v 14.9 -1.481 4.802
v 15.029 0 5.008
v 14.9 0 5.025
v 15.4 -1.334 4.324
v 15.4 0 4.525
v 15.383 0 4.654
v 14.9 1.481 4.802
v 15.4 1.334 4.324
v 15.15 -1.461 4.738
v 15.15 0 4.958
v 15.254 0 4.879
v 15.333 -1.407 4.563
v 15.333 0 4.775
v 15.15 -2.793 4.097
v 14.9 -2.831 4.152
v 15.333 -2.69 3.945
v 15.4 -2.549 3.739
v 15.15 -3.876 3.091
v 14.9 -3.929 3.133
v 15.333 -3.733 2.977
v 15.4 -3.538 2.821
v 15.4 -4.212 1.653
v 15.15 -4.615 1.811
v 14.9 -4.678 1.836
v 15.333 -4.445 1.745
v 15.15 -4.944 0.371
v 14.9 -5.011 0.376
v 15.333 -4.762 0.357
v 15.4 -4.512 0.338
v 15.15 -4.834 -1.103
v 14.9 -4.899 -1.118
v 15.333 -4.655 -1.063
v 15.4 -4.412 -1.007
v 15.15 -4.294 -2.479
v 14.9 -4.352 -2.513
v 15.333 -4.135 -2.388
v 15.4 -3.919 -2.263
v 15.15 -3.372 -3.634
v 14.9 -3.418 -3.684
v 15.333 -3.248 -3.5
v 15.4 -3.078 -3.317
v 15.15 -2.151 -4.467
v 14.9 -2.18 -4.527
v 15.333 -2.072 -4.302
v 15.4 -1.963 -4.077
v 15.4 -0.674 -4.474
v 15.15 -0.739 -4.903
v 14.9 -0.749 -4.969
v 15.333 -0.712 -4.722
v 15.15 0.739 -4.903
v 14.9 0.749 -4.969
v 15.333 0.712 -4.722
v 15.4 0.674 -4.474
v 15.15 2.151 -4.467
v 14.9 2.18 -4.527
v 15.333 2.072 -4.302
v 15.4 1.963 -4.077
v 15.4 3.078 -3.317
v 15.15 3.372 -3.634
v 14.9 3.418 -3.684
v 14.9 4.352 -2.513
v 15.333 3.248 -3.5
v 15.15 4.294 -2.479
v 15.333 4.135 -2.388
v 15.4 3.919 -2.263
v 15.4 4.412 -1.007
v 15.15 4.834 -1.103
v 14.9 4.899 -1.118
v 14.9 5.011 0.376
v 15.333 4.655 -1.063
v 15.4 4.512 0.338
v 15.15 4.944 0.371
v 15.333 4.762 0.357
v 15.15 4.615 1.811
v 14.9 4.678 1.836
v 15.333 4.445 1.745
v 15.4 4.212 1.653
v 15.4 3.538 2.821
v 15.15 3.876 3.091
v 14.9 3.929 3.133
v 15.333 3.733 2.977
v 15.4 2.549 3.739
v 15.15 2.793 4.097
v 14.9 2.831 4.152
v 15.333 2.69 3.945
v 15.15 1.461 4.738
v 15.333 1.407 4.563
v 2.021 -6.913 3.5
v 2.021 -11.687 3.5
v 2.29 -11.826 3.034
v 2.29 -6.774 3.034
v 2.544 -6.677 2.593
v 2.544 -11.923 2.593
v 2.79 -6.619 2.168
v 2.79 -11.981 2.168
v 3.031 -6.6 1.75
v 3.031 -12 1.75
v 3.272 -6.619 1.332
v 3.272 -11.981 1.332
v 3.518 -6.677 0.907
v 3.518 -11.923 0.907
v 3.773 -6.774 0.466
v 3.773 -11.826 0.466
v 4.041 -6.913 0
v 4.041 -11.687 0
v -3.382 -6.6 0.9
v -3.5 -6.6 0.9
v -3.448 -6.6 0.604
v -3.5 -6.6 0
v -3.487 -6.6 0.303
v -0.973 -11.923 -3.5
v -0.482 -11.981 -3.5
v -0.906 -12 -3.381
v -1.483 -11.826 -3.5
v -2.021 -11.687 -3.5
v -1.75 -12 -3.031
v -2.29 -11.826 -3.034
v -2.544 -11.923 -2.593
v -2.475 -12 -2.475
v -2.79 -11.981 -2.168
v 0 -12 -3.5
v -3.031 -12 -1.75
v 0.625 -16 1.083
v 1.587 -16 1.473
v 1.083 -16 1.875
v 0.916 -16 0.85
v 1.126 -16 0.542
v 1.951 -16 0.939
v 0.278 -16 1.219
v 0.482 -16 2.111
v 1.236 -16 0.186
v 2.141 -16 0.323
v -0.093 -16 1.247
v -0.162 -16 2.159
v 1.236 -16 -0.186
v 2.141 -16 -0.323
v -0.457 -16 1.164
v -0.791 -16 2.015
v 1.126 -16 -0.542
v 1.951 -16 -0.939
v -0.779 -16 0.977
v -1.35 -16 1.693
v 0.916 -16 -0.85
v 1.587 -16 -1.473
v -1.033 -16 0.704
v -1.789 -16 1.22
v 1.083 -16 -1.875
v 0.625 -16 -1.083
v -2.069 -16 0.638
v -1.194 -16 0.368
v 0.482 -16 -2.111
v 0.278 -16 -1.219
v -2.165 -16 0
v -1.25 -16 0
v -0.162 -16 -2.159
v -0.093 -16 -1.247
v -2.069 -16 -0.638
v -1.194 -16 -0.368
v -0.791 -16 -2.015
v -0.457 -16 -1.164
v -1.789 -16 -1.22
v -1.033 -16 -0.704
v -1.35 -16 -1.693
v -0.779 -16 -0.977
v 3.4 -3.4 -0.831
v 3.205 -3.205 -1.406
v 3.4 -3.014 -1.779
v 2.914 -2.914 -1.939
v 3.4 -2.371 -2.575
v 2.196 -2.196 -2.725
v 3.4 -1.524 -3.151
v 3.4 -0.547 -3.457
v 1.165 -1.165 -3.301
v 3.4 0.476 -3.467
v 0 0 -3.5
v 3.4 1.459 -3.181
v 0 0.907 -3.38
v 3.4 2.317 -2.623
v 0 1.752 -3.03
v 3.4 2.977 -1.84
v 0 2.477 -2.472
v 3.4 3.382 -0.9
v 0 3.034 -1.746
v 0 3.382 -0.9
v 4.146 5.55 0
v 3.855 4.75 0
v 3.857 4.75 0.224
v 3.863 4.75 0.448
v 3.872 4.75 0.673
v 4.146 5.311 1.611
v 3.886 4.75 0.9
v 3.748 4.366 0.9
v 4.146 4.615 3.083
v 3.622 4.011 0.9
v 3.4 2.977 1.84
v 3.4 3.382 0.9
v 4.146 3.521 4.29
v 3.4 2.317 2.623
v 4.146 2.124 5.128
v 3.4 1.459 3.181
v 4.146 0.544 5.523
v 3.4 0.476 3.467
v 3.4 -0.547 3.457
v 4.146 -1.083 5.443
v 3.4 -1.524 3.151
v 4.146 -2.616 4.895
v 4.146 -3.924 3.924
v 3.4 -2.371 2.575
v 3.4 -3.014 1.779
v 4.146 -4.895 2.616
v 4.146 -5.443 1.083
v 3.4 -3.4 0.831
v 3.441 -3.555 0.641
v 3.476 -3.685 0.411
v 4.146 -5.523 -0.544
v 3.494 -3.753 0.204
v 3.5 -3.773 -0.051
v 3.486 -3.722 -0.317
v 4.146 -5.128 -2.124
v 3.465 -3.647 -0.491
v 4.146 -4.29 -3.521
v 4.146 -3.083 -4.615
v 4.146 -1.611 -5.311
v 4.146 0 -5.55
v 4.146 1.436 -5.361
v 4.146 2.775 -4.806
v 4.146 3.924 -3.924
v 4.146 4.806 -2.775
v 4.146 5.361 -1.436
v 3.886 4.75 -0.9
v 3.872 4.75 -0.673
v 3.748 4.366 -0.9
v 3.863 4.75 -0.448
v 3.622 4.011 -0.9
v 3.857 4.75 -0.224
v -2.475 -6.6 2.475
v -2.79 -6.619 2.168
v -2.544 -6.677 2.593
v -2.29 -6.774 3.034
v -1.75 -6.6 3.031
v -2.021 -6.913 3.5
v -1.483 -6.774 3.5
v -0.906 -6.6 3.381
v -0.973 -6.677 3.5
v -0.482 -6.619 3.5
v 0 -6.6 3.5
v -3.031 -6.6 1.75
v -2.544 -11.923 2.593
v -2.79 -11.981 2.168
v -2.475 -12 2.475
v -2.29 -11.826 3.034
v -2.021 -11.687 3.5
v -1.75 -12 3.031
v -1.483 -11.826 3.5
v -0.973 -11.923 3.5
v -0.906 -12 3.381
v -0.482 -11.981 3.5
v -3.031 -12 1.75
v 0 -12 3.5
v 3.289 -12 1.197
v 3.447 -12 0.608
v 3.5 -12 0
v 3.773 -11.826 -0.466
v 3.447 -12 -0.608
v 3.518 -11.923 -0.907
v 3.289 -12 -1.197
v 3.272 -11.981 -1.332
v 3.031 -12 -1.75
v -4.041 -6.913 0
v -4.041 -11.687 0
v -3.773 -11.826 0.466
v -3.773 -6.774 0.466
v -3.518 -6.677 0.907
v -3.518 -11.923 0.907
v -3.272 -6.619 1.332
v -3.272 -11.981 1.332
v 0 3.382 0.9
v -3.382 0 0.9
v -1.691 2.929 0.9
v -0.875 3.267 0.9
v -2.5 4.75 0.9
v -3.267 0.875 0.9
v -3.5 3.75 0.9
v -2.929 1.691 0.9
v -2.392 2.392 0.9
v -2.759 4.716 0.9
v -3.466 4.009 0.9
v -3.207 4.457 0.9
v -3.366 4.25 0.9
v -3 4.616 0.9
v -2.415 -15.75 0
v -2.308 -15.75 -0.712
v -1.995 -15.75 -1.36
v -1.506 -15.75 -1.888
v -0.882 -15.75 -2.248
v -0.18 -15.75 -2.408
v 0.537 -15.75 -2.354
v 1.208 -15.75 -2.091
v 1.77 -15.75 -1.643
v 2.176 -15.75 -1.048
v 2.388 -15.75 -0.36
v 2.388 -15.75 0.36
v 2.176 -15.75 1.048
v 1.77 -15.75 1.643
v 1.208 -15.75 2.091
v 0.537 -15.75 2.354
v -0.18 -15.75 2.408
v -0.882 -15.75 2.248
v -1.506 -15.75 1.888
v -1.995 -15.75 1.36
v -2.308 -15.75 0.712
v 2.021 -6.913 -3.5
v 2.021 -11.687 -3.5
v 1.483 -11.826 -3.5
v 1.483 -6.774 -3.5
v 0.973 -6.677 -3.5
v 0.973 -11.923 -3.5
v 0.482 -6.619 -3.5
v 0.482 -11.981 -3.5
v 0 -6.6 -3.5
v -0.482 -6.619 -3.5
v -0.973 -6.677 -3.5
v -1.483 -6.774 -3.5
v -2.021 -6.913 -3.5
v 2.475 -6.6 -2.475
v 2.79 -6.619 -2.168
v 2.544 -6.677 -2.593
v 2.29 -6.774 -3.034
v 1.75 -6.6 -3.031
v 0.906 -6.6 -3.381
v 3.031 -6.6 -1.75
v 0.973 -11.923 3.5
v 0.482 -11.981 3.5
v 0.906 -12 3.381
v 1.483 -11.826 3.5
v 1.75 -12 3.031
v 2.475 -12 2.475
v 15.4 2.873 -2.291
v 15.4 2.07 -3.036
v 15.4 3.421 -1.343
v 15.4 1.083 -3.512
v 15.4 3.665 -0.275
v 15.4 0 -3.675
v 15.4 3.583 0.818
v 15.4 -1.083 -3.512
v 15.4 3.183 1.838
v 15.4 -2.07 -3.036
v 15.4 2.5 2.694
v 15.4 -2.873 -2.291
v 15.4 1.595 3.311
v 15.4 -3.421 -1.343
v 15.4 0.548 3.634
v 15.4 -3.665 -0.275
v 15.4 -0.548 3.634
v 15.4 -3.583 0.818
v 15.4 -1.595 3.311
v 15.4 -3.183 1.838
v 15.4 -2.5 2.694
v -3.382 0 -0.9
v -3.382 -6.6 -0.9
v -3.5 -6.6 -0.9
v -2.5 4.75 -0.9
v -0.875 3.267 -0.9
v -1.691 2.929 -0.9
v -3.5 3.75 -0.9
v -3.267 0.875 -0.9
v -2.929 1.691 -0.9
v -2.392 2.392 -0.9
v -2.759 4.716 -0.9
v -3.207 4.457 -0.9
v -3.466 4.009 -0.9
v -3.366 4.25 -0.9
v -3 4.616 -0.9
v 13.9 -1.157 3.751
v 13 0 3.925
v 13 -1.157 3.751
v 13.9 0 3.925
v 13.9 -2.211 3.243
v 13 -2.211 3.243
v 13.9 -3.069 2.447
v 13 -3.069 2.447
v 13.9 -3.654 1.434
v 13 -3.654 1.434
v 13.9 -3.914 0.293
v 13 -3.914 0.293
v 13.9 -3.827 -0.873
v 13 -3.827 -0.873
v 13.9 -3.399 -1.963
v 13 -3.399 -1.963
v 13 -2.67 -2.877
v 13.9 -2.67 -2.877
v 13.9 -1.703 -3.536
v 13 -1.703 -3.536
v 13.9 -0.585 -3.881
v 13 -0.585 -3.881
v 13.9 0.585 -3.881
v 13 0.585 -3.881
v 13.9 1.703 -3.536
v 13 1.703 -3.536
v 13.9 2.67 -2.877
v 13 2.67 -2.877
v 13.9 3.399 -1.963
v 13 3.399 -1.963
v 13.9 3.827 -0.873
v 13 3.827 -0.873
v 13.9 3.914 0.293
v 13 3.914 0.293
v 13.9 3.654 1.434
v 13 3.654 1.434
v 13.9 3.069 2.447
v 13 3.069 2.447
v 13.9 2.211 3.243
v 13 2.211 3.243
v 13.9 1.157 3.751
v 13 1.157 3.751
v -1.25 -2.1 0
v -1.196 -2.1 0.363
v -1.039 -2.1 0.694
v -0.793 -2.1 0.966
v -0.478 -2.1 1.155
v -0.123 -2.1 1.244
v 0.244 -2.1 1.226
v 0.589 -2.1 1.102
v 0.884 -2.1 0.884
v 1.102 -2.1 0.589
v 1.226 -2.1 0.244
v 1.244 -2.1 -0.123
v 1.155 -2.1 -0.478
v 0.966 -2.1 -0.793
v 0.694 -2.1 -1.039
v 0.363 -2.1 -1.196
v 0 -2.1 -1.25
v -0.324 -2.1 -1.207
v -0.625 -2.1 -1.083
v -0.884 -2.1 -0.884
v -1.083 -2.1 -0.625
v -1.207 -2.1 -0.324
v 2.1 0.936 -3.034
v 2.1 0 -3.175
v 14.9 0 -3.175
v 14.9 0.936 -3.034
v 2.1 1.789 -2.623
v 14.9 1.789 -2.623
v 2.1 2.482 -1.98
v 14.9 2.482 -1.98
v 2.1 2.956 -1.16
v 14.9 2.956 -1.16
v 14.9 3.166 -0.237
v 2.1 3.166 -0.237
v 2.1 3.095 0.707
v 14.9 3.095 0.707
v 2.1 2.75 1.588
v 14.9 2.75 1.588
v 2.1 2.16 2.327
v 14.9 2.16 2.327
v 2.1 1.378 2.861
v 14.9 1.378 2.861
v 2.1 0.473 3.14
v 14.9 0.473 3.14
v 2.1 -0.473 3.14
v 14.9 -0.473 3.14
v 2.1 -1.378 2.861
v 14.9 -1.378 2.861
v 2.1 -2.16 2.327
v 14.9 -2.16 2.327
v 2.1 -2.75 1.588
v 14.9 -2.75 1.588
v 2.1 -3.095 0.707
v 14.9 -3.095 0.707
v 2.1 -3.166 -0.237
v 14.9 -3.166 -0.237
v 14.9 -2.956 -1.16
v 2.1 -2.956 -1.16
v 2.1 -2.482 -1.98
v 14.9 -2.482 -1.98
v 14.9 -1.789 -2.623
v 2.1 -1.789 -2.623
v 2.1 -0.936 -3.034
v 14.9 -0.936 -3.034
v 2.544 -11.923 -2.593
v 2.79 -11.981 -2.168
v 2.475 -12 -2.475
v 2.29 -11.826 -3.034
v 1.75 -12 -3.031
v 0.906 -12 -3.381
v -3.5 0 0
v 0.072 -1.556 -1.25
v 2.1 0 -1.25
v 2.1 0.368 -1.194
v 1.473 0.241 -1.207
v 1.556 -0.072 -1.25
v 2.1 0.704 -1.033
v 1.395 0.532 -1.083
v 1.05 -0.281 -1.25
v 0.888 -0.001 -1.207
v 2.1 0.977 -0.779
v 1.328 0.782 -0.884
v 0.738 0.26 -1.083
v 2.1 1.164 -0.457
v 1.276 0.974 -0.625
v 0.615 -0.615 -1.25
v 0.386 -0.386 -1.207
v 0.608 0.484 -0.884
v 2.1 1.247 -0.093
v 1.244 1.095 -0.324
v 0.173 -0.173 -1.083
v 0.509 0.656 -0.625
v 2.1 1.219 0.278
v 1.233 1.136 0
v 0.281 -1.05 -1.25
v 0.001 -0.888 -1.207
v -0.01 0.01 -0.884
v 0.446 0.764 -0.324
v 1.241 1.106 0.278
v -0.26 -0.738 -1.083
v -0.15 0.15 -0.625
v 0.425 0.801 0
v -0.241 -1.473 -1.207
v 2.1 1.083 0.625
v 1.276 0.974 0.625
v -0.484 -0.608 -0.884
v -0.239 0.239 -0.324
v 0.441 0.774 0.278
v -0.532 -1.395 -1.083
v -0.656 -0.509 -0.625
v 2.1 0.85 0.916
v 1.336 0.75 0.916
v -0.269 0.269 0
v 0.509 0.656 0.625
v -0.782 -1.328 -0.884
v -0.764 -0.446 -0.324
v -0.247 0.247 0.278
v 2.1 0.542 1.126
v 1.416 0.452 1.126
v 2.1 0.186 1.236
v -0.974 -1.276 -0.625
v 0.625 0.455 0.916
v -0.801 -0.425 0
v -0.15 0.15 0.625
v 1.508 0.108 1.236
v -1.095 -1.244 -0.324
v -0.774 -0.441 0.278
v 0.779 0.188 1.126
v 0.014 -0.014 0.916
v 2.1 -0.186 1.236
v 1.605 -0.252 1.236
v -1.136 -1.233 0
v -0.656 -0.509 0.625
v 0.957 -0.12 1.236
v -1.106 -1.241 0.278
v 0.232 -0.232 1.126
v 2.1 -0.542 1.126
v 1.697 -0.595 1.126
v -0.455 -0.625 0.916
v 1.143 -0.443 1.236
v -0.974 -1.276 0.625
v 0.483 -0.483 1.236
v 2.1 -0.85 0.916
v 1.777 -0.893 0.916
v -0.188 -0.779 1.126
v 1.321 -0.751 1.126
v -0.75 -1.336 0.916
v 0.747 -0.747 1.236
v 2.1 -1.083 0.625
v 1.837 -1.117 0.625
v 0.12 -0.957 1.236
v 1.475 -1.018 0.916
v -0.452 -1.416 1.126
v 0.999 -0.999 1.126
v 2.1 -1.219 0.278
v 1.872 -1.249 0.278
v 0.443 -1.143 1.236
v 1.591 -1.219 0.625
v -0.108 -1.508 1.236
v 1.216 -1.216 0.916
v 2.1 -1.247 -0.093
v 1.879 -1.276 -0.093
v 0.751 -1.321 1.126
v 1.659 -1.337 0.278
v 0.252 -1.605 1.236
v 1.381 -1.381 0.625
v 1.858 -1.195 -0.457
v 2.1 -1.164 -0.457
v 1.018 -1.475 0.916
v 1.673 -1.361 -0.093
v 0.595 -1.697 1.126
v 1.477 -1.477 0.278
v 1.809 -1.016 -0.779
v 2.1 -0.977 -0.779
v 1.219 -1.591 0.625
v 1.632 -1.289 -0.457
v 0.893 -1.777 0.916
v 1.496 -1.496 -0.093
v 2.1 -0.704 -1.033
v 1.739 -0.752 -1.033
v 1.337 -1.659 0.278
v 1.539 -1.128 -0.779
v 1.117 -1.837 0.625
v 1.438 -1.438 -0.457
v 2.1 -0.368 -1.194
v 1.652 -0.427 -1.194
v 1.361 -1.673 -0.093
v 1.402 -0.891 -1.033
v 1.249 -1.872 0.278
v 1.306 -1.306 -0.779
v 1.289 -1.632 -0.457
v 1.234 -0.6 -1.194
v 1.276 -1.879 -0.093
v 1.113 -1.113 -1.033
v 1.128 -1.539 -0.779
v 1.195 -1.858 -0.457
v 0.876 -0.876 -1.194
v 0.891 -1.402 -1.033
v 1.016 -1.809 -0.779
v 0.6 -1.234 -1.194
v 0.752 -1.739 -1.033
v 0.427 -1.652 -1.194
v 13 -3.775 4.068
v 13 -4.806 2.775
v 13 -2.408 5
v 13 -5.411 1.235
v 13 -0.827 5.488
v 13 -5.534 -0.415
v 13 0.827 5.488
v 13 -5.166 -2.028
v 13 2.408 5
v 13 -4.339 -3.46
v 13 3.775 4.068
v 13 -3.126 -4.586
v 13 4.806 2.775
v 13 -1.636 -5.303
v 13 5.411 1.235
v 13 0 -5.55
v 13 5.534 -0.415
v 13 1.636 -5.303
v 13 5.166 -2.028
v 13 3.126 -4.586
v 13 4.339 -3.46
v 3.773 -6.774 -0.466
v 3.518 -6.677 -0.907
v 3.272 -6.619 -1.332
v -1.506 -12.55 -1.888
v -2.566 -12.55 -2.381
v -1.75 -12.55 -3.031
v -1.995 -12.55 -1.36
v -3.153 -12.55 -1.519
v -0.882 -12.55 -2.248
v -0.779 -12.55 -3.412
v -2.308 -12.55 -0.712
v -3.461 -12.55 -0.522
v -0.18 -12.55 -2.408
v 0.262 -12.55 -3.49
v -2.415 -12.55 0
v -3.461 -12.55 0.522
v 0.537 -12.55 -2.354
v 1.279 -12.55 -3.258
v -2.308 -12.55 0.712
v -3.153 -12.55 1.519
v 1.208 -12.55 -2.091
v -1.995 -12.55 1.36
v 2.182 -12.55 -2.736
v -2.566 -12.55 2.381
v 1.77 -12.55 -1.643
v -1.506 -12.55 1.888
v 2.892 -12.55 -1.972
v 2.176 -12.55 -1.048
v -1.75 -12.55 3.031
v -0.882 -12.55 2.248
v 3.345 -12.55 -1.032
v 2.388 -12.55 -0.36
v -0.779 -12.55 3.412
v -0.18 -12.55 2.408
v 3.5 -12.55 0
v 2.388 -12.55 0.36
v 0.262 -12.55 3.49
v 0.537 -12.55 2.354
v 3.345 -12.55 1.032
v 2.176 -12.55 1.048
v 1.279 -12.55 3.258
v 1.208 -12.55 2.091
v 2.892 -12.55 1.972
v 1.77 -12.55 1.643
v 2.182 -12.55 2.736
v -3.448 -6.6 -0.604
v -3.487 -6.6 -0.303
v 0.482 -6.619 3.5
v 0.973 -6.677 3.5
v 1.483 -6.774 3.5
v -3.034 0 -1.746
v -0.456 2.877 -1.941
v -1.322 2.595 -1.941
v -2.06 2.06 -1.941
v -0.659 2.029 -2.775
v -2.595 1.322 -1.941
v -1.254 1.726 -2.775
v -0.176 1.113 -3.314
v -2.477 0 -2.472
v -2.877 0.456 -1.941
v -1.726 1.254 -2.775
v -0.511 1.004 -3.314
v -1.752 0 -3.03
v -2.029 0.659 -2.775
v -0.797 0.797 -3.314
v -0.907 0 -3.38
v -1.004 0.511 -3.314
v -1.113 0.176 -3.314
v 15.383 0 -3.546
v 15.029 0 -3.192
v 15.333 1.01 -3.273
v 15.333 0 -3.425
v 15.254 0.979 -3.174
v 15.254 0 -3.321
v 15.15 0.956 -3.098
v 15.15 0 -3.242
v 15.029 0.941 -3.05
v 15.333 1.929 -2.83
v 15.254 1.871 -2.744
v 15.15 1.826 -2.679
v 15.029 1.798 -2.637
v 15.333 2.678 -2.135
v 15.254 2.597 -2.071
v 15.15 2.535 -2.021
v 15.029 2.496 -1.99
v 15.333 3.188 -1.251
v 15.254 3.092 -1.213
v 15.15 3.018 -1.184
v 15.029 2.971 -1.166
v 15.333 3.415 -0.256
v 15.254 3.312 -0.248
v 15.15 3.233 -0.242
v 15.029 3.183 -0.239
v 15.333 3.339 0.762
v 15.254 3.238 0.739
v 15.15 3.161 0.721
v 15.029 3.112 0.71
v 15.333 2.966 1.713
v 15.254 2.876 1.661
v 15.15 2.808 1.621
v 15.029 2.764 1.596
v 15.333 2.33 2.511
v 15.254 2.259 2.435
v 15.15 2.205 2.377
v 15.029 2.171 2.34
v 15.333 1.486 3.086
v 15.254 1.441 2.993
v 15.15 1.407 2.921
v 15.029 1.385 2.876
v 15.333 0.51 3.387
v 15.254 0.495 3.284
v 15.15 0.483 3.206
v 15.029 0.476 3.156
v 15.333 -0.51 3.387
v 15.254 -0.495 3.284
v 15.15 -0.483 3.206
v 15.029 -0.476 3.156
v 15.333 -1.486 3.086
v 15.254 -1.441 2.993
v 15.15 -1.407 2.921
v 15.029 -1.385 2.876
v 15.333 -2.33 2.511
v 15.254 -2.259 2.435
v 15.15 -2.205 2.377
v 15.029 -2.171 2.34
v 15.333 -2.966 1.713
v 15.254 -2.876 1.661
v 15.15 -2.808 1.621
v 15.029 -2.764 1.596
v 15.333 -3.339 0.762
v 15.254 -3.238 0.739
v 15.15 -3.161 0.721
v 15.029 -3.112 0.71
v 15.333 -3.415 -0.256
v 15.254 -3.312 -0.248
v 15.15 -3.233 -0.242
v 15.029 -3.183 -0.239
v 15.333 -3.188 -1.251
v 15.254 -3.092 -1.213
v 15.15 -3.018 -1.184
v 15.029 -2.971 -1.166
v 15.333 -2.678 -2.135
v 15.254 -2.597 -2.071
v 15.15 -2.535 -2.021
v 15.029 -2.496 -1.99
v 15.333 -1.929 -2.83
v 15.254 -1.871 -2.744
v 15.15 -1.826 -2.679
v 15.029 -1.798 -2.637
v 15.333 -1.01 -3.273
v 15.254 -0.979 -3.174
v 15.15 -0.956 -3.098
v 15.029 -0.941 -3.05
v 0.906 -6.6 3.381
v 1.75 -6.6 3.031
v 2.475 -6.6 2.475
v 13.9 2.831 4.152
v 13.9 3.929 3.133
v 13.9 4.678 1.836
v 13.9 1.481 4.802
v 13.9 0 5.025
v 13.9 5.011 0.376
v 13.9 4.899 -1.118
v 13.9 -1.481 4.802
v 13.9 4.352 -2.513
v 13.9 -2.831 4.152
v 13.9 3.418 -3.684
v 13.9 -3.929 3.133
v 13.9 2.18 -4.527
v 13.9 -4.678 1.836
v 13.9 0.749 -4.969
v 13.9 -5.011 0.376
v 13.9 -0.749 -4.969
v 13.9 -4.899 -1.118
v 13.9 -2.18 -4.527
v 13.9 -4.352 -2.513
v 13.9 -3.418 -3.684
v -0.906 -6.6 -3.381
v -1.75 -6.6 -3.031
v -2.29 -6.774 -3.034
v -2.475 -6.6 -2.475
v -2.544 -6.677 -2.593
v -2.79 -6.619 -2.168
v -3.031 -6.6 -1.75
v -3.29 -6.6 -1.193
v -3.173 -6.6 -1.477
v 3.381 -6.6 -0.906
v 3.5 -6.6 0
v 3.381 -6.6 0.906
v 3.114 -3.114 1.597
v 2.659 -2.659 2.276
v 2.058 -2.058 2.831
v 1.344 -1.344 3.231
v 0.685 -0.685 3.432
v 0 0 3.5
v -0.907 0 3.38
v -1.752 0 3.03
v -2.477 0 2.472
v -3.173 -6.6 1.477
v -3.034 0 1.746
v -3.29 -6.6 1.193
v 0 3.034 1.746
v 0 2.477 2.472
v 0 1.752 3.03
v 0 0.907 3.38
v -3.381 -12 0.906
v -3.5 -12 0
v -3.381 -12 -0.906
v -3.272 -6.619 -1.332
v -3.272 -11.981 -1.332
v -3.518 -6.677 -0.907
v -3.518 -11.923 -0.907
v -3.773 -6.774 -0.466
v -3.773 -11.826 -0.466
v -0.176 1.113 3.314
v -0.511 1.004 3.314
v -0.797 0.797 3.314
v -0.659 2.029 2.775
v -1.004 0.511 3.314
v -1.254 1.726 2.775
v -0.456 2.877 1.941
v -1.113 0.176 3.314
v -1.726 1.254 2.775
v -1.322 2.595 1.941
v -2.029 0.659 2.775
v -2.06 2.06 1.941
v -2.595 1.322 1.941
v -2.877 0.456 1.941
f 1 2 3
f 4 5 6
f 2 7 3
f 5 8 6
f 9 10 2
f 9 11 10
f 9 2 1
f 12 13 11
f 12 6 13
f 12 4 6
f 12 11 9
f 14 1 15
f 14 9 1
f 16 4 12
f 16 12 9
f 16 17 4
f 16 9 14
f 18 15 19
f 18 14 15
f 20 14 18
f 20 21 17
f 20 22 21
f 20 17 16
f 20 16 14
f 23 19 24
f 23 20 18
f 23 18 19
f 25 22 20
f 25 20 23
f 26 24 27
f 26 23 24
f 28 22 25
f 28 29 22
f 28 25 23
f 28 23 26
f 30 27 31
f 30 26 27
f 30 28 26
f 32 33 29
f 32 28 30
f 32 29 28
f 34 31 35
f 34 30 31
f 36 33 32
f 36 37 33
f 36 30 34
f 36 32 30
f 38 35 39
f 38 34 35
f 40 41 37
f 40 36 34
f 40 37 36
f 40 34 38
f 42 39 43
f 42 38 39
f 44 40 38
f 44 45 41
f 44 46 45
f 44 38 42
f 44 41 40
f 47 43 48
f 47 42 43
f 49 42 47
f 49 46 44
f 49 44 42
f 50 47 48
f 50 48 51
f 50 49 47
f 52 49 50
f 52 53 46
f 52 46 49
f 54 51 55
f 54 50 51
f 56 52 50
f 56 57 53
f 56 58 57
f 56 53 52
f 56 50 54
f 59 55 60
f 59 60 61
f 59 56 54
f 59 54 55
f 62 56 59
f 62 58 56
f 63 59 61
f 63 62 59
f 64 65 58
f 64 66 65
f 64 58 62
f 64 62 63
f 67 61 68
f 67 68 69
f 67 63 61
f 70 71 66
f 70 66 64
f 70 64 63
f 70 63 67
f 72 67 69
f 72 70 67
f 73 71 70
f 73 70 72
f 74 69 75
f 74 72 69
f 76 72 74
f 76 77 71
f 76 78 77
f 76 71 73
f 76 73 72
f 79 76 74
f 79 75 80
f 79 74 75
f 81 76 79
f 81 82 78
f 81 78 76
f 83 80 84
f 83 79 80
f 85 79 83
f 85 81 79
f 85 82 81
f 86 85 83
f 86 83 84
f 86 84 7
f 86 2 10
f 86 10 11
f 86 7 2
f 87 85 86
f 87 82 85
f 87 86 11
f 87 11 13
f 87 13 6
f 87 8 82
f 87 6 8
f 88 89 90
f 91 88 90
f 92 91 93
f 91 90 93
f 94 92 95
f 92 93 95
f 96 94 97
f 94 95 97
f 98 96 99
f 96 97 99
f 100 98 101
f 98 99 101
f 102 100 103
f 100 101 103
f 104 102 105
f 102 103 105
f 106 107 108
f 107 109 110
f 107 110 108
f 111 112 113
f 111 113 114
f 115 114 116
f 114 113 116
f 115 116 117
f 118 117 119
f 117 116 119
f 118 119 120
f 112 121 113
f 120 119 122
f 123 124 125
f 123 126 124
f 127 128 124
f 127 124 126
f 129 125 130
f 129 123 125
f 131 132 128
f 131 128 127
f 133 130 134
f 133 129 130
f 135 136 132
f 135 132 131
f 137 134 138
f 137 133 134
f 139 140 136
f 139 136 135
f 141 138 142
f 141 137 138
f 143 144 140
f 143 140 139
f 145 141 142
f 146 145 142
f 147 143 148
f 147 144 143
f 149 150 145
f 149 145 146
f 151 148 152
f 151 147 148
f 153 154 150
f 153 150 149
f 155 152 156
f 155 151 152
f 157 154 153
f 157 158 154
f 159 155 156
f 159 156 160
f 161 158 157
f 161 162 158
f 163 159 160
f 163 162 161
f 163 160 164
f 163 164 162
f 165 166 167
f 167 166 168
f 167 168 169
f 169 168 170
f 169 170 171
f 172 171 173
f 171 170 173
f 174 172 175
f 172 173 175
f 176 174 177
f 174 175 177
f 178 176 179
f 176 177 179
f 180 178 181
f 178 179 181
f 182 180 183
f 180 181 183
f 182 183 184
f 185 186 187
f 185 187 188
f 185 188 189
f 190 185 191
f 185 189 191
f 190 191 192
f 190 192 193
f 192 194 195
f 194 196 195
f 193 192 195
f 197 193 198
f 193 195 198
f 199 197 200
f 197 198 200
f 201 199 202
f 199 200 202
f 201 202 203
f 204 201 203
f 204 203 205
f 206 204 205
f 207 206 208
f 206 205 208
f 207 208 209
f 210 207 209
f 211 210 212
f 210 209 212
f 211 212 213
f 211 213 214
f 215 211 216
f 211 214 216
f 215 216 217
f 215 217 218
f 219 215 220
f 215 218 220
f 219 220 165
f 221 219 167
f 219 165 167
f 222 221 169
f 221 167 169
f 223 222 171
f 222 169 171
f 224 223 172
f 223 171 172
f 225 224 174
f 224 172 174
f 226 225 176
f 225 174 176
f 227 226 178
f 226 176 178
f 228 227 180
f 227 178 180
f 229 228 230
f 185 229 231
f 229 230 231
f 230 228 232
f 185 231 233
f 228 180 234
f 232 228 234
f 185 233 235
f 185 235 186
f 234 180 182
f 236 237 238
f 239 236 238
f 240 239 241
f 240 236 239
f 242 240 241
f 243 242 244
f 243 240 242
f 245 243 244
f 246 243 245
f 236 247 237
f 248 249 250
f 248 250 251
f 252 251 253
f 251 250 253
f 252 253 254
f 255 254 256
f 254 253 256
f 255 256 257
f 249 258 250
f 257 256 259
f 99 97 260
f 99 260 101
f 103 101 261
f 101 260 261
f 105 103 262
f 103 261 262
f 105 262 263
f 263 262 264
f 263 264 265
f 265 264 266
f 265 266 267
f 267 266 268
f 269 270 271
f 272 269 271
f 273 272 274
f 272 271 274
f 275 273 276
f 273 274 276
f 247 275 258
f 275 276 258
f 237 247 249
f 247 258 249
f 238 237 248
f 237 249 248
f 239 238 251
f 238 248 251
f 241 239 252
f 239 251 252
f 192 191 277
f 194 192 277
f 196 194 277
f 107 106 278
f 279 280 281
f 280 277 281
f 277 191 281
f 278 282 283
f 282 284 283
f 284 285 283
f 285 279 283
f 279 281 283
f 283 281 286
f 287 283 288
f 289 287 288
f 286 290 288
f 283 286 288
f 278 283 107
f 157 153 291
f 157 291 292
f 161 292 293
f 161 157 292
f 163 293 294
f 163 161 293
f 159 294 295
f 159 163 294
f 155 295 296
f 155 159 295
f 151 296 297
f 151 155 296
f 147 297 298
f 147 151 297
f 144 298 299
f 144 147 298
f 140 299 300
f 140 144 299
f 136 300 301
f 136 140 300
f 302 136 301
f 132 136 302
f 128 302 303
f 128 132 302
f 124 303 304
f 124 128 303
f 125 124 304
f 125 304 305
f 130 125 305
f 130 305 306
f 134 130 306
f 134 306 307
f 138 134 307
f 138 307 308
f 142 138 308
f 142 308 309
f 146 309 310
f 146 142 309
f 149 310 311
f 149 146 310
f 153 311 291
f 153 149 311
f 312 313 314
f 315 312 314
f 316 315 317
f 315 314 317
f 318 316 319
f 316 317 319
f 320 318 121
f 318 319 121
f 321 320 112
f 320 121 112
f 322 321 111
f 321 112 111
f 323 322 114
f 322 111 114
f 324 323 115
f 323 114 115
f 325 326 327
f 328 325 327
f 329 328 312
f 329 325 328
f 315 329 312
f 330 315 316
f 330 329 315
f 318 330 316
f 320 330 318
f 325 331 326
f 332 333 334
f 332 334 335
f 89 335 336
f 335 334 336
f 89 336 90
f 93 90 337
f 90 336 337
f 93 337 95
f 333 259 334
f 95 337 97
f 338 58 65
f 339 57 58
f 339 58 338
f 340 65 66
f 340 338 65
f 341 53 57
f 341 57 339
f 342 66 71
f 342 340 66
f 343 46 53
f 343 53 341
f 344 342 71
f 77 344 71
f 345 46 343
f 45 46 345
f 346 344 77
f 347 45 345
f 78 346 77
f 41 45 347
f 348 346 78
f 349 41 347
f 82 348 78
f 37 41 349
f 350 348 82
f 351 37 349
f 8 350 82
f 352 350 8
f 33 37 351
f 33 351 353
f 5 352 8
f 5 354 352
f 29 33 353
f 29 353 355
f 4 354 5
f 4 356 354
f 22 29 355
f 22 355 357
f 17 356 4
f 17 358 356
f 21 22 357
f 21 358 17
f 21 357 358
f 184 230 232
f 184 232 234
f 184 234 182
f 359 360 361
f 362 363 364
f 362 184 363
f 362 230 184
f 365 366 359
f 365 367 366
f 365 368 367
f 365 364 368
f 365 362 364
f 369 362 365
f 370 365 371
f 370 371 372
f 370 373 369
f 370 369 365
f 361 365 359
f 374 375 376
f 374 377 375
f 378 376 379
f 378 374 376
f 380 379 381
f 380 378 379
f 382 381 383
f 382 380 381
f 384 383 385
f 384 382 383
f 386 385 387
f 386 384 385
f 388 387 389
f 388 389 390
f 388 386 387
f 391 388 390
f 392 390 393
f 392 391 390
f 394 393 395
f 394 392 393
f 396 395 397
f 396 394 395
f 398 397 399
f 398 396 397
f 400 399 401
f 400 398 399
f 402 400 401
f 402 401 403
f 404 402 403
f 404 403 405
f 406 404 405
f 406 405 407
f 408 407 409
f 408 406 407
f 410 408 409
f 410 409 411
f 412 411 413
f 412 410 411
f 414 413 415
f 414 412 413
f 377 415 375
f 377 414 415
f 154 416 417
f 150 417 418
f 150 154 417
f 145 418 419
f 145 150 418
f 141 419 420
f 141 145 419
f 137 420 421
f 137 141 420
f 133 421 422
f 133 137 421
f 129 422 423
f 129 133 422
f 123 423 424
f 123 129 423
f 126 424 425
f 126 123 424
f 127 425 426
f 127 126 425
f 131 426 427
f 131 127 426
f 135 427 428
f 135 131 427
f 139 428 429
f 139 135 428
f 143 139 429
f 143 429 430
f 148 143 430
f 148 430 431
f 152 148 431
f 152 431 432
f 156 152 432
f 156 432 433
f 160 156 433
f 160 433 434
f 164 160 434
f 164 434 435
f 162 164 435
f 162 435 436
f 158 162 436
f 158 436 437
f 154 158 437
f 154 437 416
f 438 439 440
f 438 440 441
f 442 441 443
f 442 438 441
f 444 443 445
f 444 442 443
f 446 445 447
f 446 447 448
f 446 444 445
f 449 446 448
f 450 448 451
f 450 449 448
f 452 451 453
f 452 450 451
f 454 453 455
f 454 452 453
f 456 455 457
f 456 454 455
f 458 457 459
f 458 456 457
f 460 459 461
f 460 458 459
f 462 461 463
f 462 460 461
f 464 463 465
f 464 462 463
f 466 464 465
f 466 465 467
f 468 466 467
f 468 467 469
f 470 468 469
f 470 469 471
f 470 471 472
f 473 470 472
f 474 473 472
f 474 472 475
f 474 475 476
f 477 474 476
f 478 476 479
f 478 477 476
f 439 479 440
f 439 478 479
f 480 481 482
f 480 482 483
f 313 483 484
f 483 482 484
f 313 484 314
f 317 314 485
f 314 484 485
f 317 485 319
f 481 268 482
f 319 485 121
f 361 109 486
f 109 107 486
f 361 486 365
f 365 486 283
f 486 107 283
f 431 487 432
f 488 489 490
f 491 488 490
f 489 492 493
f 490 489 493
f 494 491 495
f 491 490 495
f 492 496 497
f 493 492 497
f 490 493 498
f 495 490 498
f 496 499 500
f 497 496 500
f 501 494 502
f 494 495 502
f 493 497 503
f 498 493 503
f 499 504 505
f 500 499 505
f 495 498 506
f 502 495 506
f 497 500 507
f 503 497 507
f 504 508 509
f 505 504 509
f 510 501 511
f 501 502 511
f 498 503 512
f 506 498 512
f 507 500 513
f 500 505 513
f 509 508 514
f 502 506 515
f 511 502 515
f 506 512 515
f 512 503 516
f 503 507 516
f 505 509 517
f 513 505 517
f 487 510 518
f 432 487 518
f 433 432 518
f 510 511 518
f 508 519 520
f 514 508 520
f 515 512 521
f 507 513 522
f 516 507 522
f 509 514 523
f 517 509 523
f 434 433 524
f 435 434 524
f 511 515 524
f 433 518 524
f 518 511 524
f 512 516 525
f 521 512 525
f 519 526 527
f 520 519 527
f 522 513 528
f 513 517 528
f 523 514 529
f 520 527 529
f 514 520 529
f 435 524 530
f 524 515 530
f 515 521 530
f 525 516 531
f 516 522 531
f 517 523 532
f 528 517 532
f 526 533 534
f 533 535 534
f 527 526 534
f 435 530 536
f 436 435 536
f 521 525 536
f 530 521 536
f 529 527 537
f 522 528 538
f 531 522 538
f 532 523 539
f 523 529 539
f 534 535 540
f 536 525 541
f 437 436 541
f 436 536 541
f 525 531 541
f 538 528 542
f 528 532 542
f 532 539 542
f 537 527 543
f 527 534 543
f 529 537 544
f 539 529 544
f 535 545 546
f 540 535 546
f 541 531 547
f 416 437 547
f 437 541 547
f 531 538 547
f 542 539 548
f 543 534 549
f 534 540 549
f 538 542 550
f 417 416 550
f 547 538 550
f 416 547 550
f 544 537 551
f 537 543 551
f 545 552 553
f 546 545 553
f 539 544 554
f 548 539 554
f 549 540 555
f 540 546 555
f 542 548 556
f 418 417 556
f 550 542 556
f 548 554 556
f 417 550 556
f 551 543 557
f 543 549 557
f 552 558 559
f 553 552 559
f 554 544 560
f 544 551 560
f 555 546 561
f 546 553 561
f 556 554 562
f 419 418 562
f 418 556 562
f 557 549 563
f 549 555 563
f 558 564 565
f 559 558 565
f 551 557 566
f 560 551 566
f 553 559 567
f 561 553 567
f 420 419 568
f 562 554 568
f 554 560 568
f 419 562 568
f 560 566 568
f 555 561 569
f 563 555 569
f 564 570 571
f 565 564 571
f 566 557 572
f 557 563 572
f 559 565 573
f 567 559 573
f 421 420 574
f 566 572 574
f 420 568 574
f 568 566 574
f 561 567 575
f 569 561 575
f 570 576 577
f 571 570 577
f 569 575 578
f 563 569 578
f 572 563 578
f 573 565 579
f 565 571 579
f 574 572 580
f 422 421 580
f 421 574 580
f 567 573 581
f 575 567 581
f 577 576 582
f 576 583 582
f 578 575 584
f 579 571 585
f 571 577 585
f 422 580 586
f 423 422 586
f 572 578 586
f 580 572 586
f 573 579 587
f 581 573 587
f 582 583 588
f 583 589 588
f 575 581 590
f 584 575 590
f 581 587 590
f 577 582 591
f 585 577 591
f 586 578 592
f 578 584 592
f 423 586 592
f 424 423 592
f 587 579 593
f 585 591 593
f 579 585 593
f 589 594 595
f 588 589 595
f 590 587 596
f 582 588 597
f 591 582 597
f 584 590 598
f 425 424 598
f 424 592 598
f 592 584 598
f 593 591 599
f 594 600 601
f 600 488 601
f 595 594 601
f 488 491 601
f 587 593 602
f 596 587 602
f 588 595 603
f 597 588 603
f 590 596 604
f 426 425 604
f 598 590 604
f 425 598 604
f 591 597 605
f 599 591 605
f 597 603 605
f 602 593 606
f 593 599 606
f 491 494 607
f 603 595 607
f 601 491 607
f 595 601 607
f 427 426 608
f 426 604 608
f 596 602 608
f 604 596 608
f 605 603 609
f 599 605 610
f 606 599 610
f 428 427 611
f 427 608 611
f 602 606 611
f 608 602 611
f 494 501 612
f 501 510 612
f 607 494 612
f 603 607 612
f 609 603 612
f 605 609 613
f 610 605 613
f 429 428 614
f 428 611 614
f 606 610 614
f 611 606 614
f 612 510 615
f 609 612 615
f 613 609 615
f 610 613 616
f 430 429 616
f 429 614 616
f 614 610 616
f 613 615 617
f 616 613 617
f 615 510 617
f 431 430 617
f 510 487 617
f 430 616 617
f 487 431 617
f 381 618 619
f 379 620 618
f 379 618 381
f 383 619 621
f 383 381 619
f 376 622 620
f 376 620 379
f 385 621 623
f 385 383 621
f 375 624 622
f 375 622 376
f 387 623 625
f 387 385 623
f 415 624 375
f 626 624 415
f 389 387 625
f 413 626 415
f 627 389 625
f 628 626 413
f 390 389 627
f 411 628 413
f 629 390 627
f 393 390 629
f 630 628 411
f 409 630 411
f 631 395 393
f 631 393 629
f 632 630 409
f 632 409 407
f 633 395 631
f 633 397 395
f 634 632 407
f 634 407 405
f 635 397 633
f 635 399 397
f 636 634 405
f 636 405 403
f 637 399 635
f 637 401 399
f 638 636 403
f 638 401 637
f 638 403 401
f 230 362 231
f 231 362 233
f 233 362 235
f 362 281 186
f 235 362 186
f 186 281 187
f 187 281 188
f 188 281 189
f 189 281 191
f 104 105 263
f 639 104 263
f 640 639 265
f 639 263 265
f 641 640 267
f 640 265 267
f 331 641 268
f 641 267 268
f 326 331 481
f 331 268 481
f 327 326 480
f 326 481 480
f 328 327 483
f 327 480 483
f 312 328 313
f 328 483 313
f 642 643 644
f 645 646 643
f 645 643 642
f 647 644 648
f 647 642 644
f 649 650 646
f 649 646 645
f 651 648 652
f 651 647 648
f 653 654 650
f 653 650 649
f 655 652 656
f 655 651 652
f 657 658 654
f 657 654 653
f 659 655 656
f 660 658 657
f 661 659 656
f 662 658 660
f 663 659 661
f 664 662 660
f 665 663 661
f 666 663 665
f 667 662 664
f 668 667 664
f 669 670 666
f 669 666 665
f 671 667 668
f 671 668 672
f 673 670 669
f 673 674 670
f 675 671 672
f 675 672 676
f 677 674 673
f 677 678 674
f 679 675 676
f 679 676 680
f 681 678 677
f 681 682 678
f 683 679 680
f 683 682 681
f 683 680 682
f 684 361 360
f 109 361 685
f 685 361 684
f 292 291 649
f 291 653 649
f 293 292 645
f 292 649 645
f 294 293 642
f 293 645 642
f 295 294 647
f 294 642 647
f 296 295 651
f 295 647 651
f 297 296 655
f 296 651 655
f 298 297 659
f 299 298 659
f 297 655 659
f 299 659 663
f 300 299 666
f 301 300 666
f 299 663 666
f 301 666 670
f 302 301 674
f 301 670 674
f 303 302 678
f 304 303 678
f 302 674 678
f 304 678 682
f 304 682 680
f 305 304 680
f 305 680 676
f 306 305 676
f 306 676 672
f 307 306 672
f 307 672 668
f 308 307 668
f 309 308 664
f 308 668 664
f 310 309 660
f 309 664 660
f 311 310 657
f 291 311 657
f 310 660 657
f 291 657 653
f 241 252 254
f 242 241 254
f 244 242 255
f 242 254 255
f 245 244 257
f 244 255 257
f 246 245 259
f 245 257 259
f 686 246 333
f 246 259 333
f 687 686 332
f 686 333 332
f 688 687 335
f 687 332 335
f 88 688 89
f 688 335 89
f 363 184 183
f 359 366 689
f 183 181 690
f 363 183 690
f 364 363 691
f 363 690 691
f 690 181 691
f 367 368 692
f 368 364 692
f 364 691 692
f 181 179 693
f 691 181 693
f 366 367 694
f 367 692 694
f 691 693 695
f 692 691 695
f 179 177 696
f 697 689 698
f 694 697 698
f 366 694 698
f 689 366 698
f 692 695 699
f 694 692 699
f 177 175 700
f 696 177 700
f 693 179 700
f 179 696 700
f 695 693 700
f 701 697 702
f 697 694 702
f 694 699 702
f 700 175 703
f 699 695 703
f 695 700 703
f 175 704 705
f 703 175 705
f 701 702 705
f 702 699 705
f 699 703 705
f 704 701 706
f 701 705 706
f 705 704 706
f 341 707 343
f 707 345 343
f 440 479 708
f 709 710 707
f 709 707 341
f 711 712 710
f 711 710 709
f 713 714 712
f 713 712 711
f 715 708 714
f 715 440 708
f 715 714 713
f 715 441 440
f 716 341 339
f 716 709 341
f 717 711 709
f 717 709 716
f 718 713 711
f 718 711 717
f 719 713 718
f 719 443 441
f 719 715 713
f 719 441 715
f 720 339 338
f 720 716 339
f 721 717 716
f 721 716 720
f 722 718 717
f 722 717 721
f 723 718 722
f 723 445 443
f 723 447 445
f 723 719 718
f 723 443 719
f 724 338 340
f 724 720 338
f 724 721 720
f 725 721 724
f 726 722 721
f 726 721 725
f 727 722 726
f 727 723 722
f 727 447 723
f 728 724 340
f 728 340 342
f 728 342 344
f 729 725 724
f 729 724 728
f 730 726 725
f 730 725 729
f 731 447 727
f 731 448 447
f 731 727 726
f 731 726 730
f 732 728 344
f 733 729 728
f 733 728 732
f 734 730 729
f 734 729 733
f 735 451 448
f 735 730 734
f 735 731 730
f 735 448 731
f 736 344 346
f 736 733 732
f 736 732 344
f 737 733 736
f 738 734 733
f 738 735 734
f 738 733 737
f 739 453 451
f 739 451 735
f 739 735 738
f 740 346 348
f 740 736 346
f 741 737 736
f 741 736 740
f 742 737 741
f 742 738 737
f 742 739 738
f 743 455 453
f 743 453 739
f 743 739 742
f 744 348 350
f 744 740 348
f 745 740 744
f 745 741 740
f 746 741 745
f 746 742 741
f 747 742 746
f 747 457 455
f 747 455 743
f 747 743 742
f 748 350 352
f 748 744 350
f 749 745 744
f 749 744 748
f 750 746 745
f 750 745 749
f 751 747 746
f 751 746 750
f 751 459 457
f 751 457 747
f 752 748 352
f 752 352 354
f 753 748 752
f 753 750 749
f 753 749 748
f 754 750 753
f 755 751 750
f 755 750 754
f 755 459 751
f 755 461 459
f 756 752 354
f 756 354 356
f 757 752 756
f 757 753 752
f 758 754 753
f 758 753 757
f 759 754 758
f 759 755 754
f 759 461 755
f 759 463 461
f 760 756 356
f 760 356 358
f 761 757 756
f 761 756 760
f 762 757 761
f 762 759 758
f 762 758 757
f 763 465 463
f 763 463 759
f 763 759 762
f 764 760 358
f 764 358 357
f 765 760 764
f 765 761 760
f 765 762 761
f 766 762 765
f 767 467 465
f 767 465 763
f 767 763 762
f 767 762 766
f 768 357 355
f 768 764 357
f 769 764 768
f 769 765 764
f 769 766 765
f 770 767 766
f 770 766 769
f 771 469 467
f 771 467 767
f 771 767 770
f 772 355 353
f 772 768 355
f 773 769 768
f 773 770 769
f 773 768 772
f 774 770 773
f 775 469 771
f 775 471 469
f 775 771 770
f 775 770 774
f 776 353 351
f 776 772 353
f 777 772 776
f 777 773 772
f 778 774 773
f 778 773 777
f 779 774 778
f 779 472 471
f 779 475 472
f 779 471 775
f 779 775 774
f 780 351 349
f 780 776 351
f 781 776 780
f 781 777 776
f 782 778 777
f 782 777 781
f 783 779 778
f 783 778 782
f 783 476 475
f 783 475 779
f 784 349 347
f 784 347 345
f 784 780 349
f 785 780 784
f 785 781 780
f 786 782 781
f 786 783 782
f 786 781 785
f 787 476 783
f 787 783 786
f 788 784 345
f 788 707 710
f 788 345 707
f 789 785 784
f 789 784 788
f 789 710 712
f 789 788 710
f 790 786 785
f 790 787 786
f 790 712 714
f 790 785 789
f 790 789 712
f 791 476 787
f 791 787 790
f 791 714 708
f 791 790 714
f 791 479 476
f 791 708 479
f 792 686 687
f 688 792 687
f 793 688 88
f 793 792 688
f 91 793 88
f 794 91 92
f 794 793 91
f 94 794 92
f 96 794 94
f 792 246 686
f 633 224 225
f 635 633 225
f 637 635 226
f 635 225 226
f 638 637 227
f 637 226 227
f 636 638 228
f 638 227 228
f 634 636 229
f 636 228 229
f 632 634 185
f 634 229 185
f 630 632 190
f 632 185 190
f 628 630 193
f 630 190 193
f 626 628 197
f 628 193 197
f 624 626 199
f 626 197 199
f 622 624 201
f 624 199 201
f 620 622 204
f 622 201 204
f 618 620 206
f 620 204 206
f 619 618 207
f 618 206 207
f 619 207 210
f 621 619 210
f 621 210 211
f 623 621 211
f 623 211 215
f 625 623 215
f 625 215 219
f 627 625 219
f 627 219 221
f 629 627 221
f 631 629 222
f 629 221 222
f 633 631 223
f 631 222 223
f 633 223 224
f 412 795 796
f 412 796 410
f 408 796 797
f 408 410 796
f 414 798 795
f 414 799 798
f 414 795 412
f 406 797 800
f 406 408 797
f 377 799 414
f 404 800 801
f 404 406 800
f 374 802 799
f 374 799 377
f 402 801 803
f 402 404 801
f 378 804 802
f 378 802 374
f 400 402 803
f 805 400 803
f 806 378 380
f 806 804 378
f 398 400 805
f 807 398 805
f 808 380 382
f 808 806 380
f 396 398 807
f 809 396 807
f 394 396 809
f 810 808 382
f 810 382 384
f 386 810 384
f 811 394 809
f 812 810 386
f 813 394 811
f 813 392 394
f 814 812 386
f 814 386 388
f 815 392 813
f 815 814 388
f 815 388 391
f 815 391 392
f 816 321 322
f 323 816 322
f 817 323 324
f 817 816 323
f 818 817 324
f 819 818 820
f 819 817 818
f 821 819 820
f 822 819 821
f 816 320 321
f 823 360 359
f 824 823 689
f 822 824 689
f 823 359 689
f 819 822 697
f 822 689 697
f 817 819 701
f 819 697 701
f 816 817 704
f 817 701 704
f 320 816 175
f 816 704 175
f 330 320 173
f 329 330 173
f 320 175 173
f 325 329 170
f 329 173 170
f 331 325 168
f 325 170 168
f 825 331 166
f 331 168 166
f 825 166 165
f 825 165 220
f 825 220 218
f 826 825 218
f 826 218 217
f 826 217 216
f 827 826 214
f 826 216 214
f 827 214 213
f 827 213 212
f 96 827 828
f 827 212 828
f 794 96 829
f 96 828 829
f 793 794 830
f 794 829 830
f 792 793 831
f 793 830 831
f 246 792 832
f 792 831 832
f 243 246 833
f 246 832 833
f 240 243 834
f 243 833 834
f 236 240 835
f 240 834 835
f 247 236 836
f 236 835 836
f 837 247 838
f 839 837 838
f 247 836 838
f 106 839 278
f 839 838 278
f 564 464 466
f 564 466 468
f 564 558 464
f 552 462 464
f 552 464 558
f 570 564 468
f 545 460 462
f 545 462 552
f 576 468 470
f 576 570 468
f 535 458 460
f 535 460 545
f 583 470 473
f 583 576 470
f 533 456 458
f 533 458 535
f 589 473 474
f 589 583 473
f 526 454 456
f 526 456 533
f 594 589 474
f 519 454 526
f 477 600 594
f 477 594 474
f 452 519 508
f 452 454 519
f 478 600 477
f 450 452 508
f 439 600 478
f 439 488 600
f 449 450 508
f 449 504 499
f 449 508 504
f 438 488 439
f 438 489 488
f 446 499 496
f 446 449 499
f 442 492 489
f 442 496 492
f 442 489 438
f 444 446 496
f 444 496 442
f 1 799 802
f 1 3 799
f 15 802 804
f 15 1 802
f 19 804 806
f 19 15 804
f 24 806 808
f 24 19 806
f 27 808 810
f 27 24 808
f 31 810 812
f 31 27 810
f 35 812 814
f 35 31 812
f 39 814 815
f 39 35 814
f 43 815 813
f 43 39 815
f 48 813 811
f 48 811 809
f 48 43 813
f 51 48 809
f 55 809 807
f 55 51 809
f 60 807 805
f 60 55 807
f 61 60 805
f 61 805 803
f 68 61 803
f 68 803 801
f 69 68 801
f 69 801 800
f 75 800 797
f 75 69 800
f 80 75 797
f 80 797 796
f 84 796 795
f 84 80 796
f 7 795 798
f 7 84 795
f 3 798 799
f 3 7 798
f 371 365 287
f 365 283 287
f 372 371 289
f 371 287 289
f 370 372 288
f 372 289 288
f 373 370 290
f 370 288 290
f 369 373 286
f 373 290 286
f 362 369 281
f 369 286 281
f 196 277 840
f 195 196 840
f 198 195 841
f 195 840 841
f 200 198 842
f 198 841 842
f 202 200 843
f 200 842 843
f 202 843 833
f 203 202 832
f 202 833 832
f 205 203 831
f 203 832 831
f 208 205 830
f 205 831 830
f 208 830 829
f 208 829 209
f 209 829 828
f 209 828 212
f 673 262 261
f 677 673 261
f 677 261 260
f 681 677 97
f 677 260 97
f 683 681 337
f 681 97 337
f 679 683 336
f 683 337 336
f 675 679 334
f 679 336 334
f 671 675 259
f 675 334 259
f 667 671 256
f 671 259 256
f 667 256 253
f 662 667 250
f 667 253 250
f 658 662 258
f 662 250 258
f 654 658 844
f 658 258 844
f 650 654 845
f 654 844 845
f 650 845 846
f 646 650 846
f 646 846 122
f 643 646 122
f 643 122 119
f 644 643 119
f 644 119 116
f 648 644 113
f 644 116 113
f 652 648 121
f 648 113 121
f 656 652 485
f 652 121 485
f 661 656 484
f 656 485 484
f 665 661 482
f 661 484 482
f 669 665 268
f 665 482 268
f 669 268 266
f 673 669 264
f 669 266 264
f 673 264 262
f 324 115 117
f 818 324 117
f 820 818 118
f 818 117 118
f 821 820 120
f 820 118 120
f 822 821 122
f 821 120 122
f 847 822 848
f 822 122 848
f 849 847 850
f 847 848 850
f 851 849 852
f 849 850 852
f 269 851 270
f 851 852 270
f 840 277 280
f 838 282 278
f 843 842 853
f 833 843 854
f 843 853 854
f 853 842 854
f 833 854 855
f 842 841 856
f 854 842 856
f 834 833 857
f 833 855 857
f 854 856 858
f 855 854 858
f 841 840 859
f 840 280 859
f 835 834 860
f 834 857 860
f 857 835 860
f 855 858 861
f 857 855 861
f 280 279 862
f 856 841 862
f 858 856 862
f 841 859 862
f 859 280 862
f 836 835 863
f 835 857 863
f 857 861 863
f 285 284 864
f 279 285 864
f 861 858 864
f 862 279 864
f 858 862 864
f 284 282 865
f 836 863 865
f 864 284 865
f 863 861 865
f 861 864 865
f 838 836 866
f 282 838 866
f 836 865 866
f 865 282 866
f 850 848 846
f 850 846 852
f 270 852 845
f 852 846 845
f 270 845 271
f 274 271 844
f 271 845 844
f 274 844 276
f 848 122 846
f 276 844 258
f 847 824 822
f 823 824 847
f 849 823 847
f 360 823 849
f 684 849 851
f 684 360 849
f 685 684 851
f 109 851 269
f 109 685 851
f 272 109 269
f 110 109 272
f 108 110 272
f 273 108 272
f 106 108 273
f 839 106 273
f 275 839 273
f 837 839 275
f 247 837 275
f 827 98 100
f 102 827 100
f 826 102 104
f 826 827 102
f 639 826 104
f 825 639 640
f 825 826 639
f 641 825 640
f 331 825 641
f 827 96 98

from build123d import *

# Parameters (mm, degrees)
SKETCH1_R             = 3.5
BASE_EXTRUDE_DEPTH    = 3.4
RBODY_SKETCH_R        = 5.55
RBODY_DEPTH           = 9.6
ELBOW_ANGLE           = 90
SKETCH3_R             = 3.5
BOSS_EXTRUDE1_DEPTH   = 6.6
BOSS_EXTRUDE2_DEPTH   = 0.9
NUT_DEPTH             = 5.4
THREADS_SKETCH_W      = 2.415
THREADS_SKETCH_H      = 4
THREAD_CHAMFER_SIZE   = 0.25
RTUBE_START           = -13.3
RTUBE_SKETCH_R        = 3.175
RTUBE_DEPTH           = 13.3
RTUBE_RADIUS_R        = 0.5
DIAMETER_R            = 1.25
SKETCH4_W             = 3.5
SKETCH4_H             = 0.55
PORT_THREADS_REACH    = 29.062
PORT_THREADS_SKETCH_R = 1.25


with BuildPart() as part:
    # Sketch1 → Base-Extrude (new body)
    with BuildSketch(Plane(origin=(0, 0, 0), x_dir=(0, 0, -1), z_dir=(1, 0, 0))):
        Circle(SKETCH1_R)
    extrude(amount=BASE_EXTRUDE_DEPTH)

    # RBody_Sketch → RBody (add)
    with BuildSketch(Plane(origin=(3.4, 0, 0), x_dir=(0, 0, -1), z_dir=(1, 0, 0))):
        Circle(RBODY_SKETCH_R)
    extrude(amount=RBODY_DEPTH)

    # RBody_Chamfer: read off the stored shape, not the designer's step
    # RBody_Chamfer outline → RBody_Chamfer (revolve, cut)
    with BuildSketch(Plane.YX):
        Polygon((5.55, 4.14613898), (3.5, 3.4), (5.55, 3.4), align=None)
    revolve(axis=Axis((0, 0, 0), (1, 0, 0)), mode=Mode.SUBTRACT)

    # RRelease_Sketch → RRelease (revolve)
    with BuildSketch(Plane.XY, mode=Mode.PRIVATE) as rrelease_sk:
        with BuildLine():
            Line((13, 3.925), (13.9, 3.925))
            Line((13.9, 3.925), (13.9, 5.025))
            Line((13.9, 5.025), (14.9, 5.025))
            ThreePointArc((14.9, 5.025), (15.253553391, 4.878553391), (15.4, 4.525))
            Line((15.4, 4.525), (15.4, 0))
            Line((15.4, 0), (13, 0))
            Line((13, 0), (13, 3.925))
        make_face()
    revolve(rrelease_sk.sketch.rotate(Axis((12.597722381, 0, 0), (1, 0, 0)), 90), axis=Axis((12.597722381, 0, 0), (1, 0, 0)))

    # Elbow_Sketch → Elbow (revolve)
    with BuildSketch(Plane.ZY):
        with BuildLine():
            Line((-3.5, 0), (3.5, 0))
            ThreePointArc((3.5, 0), (0, 3.5), (-3.5, 0))
        make_face()
    revolve(axis=Axis((0, 0, -6.487672297), (0, 0, 1)), revolution_arc=ELBOW_ANGLE)

    # Sketch3 → Boss-Extrude1 (add)
    with BuildSketch(Plane.XZ):
        with Locations(Location((0, 0, 0), (0, 0, 90))):
            Circle(SKETCH3_R)
    extrude(amount=BOSS_EXTRUDE1_DEPTH)

    # Sketch8 → Boss-Extrude2 (add, symmetric)
    with BuildSketch(Plane.XY):
        with BuildLine():
            Line((-3.5, -6.6), (-3.5, 3.75))
            ThreePointArc((-3.5, 3.75), (-3.207106781, 4.457106781), (-2.5, 4.75))
            Line((-2.5, 4.75), (4.14613898, 4.75))
            Line((4.14613898, 4.75), (4.14613898, 0))
            Line((4.14613898, 0), (0, 0))
            Line((0, 0), (0, -6.6))
            Line((0, -6.6), (-3.5, -6.6))
        make_face()
    extrude(amount=BOSS_EXTRUDE2_DEPTH, both=True)

    # Nut_Sketch → Nut (add)
    with BuildSketch(Plane(origin=(0, -12, 0), x_dir=(-1, 0, 0), z_dir=(0, 1, 0))):
        Polygon((4.041451884, 0), (2.020725942, 3.5), (-2.020725942, 3.5), (-4.041451884, 0), (-2.020725942, -3.5), (2.020725942, -3.5), align=None)
    extrude(amount=NUT_DEPTH)

    # Nut_Chamfer_Sketch → Nut_Chamfer (revolve, cut)
    with BuildSketch(Plane.XY):
        Polygon((-3.5, -6.6), (-4.041451884, -6.6), (-4.041451884, -6.912607391), align=None)
        Polygon((-4.041451884, -11.687392609), (-3.5, -12), (-4.041451884, -12), align=None)
    revolve(axis=Axis((0, -1.551633987, 0), (0, 1, 0)), mode=Mode.SUBTRACT)

    # Threads_Sketch → Threads (revolve)
    with BuildSketch(Plane.XY):
        with Locations((-1.2075, -14)):
            Rectangle(THREADS_SKETCH_W, THREADS_SKETCH_H)
    revolve(axis=Axis((0, 0, 0), (0, -1, 0)))

    # Thread_Chamfer
    thread_chamfer_edges = [part.edges().sort_by_distance(p)[0] for p in [
        (2.415, -16, 0),
    ]]
    chamfer(thread_chamfer_edges, length=THREAD_CHAMFER_SIZE)

    # RTube_Sketch → RTube (cut)
    with BuildSketch(Plane(origin=(15.4, 0, 0), x_dir=(0, 0, -1), z_dir=(1, 0, 0)).offset(RTUBE_START)):
        Circle(RTUBE_SKETCH_R)
    extrude(amount=RTUBE_DEPTH, mode=Mode.SUBTRACT)

    # RTube_Radius
    rtube_radius_edges = [part.edges().sort_by_distance(p)[0] for p in [
        (15.4, 0, 3.175),
    ]]
    fillet(rtube_radius_edges, radius=RTUBE_RADIUS_R)

    # Port_Curve: sweep along a path in Profile
    with BuildLine(Plane.XY) as port_curve_path:
        ThreePointArc((2.1, 0), (0.61507576, -0.61507576), (0, -2.1))
    # Diameter → Port_Curve (sweep, cut)
    with BuildSketch(Plane(origin=(2.1, 0, 0), x_dir=(0, 0, -1), z_dir=(1, 0, 0))):
        Circle(DIAMETER_R)
    sweep(path=port_curve_path.line, mode=Mode.SUBTRACT)

    # Sketch4 → Revolve1 (revolve)
    with BuildSketch(Plane.XY, mode=Mode.PRIVATE) as revolve1_sk:
        with Locations((-1.75, -12.275)):
            Rectangle(SKETCH4_W, SKETCH4_H)
    revolve(revolve1_sk.sketch.rotate(Axis((0, 0, 0), (0, -1, 0)), 180), axis=Axis((0, 0, 0), (0, -1, 0)))

    # Port_Threads_Sketch → Port_Threads (cut, up to next)
    with BuildSketch(Plane(origin=(0, -16, 0), x_dir=(-1, 0, 0), z_dir=(0, 1, 0)), mode=Mode.PRIVATE) as port_threads_sk1:
        Circle(PORT_THREADS_SKETCH_R)
    port_threads_tool1 = extrude(port_threads_sk1.sketch, amount=PORT_THREADS_REACH, mode=Mode.PRIVATE) & part.part
    add(port_threads_tool1.solids().sort_by_distance((0, -16, 0))[0], mode=Mode.SUBTRACT)


solid = part.part
